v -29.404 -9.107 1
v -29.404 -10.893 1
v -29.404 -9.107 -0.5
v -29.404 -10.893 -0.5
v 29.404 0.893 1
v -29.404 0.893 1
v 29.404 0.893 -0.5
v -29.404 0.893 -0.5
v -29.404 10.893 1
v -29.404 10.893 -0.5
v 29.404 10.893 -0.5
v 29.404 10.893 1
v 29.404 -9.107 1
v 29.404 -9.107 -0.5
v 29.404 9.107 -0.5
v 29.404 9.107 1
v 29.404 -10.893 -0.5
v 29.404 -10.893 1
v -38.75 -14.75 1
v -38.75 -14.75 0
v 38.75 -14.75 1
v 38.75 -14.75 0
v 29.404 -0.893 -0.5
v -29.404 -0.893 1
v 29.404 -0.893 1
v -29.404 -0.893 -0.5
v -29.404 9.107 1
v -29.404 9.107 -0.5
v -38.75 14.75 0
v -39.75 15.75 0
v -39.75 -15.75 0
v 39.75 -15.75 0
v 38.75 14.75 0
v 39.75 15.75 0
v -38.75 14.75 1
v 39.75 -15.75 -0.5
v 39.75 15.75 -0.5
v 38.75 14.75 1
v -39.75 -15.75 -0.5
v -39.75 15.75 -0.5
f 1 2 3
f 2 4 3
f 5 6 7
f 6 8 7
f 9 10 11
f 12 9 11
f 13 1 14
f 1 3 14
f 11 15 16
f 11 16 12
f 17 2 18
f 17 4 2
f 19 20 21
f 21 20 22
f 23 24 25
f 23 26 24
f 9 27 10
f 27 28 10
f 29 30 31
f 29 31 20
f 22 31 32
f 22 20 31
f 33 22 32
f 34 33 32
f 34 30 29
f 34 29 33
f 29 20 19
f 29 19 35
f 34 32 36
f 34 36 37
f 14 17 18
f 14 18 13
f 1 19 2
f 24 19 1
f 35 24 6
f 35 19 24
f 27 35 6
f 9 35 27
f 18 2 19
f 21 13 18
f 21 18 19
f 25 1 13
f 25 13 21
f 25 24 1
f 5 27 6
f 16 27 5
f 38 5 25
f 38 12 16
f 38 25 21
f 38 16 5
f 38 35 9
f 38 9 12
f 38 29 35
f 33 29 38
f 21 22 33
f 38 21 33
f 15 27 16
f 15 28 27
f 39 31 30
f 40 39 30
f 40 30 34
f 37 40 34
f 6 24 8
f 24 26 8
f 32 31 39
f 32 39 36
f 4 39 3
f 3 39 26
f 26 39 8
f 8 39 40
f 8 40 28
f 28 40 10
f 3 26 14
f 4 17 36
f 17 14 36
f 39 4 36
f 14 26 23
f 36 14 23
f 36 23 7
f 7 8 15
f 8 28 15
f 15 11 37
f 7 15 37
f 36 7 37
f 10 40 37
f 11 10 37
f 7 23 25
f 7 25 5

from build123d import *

# Parameters (mm, degrees)
F0_W     = 79.5
F0_H     = 31.5
F0_W_2   = 77.5
F0_H_2   = 29.5
F0_W_3   = 58.807618
F0_H_3   = 1.786274
F1_DEPTH = 0.5
F2_DEPTH = 1


with BuildPart() as f1:
    # F0 (on Top) → F1 (new body)
    with BuildSketch(Plane.XY):
        Rectangle(F0_W, F0_H)
        Rectangle(F0_W_2, F0_H_2, mode=Mode.SUBTRACT)
        Rectangle(F0_W_2, F0_H_2)
        with Locations((0, -10)):
            Rectangle(F0_W_3, F0_H_3, mode=Mode.SUBTRACT)
        Rectangle(F0_W_3, F0_H_3, mode=Mode.SUBTRACT)
        with Locations((0, 10)):
            Rectangle(F0_W_3, F0_H_3, mode=Mode.SUBTRACT)
    extrude(amount=-F1_DEPTH)

    # F0 (on Top) → F2 (join)
    with BuildSketch(Plane.XY):
        Rectangle(F0_W_2, F0_H_2)
        with Locations((0, -10)):
            Rectangle(F0_W_3, F0_H_3, mode=Mode.SUBTRACT)
        Rectangle(F0_W_3, F0_H_3, mode=Mode.SUBTRACT)
        with Locations((0, 10)):
            Rectangle(F0_W_3, F0_H_3, mode=Mode.SUBTRACT)
    extrude(amount=F2_DEPTH)


solid = f1.part
